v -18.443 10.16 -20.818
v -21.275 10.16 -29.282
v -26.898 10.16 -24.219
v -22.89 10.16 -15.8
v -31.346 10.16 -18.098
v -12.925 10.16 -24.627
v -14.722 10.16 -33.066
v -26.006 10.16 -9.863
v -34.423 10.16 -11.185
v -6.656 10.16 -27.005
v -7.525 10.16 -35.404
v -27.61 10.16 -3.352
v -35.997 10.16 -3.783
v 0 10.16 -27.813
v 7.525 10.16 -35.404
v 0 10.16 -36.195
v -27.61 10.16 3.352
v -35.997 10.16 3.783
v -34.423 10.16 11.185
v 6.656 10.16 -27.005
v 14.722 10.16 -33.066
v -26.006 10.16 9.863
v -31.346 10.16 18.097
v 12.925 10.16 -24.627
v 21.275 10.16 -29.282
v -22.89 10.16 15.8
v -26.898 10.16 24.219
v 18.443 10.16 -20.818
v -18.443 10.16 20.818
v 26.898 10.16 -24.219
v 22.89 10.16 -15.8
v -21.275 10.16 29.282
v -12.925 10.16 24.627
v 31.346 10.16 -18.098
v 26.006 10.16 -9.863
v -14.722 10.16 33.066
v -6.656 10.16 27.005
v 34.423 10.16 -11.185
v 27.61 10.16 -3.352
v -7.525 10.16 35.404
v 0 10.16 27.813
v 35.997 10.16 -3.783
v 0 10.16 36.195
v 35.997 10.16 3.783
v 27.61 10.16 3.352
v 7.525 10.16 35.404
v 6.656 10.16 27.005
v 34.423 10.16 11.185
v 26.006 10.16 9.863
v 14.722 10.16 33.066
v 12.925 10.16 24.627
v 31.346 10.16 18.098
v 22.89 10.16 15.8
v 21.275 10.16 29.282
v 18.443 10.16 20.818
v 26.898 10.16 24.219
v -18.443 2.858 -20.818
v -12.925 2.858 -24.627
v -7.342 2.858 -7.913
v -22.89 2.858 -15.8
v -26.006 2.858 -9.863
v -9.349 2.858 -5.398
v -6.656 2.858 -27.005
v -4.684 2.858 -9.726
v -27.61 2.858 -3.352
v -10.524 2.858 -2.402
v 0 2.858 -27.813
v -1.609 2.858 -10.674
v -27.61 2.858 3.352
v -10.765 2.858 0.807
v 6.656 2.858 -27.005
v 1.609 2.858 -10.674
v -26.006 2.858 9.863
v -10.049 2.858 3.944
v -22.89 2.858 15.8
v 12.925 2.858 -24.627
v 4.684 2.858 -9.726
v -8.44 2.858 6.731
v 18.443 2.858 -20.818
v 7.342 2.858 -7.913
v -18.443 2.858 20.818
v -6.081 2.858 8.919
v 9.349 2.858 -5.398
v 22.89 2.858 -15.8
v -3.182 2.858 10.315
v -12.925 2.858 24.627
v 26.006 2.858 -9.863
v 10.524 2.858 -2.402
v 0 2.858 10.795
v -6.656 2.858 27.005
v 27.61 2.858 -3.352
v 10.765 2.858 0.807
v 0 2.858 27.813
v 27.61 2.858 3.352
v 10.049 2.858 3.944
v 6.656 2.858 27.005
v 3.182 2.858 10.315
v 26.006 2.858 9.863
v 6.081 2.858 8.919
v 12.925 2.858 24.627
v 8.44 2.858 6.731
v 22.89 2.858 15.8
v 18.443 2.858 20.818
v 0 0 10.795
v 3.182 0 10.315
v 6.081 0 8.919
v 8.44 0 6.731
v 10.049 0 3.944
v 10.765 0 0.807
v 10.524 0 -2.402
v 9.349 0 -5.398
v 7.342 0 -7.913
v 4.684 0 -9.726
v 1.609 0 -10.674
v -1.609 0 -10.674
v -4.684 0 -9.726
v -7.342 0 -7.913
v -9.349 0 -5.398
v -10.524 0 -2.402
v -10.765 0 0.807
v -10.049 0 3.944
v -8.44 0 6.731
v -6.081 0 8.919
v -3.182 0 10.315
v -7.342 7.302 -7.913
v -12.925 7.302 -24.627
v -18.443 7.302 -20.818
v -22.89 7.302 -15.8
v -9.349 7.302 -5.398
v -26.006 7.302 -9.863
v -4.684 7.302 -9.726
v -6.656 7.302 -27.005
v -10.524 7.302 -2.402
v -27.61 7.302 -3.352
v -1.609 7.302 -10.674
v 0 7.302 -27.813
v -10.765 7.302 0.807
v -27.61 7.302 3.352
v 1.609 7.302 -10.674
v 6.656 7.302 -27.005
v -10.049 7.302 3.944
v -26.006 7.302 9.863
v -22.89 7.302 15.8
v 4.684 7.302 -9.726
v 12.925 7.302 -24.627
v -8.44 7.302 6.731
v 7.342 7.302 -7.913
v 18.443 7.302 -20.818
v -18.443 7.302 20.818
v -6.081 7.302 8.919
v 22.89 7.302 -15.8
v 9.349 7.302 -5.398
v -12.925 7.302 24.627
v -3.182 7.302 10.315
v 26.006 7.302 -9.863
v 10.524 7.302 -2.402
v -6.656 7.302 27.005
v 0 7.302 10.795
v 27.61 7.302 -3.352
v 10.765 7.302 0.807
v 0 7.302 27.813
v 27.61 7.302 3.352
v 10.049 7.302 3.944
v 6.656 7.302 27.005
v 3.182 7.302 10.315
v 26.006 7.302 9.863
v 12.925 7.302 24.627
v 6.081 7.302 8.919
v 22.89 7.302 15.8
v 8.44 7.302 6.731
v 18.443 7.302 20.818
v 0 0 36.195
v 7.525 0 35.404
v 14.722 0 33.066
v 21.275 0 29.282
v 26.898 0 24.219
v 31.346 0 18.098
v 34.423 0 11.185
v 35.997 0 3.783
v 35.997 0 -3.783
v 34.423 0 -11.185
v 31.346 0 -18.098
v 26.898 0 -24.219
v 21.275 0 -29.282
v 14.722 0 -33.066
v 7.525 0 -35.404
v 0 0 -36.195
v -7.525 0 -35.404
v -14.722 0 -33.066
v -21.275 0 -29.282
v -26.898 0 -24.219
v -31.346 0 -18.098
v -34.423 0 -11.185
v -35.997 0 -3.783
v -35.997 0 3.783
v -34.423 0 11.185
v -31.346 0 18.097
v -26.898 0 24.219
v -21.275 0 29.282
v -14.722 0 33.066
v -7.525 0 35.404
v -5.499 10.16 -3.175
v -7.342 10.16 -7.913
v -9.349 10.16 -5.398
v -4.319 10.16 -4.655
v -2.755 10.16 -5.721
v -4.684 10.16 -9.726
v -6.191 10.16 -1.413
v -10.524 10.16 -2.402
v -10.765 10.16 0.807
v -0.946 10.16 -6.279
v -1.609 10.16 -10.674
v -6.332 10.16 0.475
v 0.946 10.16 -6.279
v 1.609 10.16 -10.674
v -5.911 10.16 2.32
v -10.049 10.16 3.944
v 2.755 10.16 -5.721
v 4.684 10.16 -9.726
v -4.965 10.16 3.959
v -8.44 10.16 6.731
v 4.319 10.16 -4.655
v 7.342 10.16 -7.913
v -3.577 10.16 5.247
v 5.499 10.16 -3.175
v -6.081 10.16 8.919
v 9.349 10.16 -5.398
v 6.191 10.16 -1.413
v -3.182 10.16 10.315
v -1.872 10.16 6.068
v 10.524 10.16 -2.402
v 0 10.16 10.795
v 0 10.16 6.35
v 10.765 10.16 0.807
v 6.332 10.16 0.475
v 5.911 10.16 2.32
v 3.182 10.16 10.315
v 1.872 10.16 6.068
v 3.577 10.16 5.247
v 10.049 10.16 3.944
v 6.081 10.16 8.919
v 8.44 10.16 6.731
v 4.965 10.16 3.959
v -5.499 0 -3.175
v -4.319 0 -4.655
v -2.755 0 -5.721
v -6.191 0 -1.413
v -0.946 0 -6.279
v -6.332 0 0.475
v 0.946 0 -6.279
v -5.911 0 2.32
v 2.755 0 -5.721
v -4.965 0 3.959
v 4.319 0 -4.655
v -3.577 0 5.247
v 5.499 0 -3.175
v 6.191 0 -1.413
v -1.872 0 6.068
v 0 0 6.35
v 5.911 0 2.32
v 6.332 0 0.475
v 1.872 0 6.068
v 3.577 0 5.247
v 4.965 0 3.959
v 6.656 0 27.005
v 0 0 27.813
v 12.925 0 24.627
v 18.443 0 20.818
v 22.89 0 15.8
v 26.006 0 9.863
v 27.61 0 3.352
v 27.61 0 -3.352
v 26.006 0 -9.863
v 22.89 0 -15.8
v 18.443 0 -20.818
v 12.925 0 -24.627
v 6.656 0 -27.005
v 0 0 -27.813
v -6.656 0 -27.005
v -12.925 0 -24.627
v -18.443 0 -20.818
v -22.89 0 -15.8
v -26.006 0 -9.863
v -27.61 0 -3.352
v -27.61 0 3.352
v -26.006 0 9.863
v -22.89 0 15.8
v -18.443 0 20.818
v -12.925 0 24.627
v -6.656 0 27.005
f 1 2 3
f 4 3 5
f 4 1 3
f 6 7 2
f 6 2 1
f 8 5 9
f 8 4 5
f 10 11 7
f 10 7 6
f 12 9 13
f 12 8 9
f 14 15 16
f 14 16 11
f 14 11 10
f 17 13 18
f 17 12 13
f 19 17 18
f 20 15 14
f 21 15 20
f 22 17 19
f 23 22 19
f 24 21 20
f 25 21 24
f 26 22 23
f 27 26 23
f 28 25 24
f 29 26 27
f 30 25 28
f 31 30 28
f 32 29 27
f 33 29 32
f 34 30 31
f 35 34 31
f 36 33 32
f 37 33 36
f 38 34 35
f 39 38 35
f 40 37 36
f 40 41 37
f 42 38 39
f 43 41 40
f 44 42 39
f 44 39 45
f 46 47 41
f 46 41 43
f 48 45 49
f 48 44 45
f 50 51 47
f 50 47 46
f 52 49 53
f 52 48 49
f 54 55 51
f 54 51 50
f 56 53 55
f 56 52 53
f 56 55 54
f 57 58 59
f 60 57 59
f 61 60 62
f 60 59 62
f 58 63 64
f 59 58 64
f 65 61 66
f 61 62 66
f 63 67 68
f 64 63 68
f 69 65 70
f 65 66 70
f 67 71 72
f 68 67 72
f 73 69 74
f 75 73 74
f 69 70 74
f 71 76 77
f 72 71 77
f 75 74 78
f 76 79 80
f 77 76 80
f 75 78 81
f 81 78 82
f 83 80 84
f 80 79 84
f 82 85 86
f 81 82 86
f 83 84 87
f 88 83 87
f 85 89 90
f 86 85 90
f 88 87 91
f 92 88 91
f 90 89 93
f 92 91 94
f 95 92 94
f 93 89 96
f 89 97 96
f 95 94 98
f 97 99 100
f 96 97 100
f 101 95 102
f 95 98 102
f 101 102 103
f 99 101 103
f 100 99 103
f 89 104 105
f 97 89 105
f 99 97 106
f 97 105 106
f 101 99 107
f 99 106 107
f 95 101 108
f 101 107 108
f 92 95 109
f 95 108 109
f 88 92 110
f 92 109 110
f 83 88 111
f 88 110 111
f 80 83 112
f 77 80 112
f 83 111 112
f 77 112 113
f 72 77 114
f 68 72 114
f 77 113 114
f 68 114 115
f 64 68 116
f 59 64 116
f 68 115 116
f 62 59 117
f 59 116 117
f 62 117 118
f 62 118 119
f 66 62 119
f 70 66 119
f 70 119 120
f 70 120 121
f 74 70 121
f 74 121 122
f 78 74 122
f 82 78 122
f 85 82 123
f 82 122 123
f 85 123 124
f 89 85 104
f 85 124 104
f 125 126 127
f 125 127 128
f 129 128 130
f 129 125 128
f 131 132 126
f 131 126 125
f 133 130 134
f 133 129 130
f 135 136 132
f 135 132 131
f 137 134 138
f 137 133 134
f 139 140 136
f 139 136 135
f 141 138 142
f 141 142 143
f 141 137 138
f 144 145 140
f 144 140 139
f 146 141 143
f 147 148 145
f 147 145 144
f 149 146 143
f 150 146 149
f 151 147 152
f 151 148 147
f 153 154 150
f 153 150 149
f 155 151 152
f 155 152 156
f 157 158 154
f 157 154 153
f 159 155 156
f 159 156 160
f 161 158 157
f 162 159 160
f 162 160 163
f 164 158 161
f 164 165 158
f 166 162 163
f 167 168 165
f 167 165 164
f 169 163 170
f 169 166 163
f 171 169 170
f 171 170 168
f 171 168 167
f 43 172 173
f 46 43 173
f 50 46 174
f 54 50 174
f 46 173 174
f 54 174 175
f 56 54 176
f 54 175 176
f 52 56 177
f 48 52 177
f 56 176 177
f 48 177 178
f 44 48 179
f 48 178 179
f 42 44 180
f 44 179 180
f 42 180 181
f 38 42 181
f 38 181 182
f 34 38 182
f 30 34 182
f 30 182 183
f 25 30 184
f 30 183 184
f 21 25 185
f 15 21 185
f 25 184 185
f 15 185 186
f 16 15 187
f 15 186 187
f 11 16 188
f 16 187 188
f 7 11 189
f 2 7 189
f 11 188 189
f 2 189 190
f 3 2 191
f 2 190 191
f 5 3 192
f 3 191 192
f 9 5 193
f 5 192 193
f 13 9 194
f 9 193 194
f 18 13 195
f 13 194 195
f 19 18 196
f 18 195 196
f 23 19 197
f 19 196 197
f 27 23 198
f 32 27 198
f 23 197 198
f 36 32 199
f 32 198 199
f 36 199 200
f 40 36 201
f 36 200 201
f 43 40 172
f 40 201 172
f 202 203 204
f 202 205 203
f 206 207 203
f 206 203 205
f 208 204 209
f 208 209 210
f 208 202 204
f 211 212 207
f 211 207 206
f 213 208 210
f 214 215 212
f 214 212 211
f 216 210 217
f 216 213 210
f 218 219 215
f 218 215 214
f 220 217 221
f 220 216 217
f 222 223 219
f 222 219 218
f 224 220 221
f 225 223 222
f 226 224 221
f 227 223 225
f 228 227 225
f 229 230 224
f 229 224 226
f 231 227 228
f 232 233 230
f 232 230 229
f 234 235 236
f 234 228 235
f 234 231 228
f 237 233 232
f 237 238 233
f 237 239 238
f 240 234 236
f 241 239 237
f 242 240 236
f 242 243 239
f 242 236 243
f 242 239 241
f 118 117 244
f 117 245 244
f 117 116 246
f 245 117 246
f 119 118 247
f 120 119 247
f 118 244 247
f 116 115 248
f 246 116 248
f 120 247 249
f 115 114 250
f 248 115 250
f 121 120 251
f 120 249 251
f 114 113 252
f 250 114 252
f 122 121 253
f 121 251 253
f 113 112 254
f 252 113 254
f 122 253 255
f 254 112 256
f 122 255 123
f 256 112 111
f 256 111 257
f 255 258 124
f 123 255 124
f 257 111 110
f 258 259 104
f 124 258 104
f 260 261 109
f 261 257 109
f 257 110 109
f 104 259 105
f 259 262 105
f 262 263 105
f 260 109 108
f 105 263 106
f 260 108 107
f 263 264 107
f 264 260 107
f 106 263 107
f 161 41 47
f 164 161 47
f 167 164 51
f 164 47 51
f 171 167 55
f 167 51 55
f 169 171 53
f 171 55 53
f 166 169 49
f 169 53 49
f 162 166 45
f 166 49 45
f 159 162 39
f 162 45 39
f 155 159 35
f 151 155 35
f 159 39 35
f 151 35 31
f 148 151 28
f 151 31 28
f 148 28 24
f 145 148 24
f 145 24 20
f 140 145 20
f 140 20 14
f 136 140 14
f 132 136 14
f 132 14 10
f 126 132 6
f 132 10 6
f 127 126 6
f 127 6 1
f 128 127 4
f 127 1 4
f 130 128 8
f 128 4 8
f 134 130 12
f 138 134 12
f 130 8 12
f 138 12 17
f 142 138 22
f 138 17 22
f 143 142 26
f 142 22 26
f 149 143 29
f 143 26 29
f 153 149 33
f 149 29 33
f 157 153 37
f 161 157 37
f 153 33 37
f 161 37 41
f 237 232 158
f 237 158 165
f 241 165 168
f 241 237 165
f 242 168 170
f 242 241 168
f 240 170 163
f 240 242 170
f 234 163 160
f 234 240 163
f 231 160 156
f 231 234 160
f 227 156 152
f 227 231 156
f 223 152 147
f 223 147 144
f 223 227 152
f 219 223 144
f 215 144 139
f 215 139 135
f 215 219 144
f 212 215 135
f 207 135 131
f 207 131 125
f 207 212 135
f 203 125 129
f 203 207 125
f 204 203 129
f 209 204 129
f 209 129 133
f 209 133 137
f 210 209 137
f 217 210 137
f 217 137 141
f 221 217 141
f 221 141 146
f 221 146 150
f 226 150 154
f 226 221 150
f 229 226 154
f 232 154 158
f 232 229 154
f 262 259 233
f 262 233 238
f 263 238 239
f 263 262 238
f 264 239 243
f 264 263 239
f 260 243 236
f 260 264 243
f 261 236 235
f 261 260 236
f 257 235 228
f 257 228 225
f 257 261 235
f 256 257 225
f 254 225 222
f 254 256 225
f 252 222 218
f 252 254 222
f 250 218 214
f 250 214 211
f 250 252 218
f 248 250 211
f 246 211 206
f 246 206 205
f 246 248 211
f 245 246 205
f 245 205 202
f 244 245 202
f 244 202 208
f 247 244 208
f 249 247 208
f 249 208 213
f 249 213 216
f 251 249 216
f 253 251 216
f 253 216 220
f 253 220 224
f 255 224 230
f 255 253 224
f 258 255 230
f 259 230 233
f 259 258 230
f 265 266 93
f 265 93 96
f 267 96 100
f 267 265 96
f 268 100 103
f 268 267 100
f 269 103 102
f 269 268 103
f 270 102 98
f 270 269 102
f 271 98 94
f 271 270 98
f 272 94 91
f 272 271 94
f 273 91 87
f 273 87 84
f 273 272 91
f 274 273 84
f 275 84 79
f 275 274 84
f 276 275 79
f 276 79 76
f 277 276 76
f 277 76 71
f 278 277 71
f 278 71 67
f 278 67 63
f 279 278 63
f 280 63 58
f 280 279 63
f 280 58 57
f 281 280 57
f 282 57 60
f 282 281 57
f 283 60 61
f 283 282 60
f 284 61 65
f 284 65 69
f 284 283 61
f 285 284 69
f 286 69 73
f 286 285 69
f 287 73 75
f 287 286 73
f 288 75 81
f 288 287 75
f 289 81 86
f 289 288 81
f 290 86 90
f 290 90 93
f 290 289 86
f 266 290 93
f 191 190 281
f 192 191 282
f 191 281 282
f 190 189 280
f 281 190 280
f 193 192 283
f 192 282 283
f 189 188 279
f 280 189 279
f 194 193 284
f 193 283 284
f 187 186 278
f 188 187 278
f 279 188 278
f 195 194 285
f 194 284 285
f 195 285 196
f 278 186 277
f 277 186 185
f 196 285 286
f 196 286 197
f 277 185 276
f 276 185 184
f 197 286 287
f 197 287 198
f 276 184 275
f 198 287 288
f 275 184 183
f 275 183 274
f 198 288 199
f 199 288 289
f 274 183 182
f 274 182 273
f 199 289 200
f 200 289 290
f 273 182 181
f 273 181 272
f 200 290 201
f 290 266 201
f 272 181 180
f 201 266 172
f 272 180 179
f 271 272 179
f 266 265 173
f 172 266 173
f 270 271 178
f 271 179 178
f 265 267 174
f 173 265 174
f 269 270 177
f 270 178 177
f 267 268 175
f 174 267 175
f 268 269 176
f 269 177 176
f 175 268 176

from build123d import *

# Parameters (mm, degrees)
SKETCH1_R          = 36.195
SKETCH1_R_2        = 6.35
DISK_DEPTH         = 10.16
SKETCH2_R          = 27.813
SKETCH2_R_2        = 10.795
CUT_EXTRUDE1_DEPTH = 2.8575


with BuildPart() as part:
    # Sketch1 → Disk (new body)
    with BuildSketch(Plane(origin=(0, 0, 0), x_dir=(1, 0, 0), z_dir=(0, 1, 0))):
        with Locations(Location((0, 0, 0), (0, 0, 270))):
            Circle(SKETCH1_R)
        with Locations(Location((0, 0, 0), (0, 0, 270))):
            Circle(SKETCH1_R_2, mode=Mode.SUBTRACT)
    extrude(amount=DISK_DEPTH)

    # Sketch2 → Cut-Extrude1 (cut)
    with BuildSketch(Plane(origin=(0, 10.16, 0), x_dir=(1, 0, 0), z_dir=(0, 1, 0))):
        with Locations(Location((0, 0, 0), (0, 0, 270))):
            Circle(SKETCH2_R)
        with Locations(Location((0, 0, 0), (0, 0, 270))):
            Circle(SKETCH2_R_2, mode=Mode.SUBTRACT)
    cut_extrude1 = extrude(amount=-CUT_EXTRUDE1_DEPTH, mode=Mode.SUBTRACT)

    # Mirror1: Cut-Extrude1 across plane
    add(cut_extrude1.mirror(Plane.ZX.offset(5.08)), mode=Mode.SUBTRACT)


solid = part.part
